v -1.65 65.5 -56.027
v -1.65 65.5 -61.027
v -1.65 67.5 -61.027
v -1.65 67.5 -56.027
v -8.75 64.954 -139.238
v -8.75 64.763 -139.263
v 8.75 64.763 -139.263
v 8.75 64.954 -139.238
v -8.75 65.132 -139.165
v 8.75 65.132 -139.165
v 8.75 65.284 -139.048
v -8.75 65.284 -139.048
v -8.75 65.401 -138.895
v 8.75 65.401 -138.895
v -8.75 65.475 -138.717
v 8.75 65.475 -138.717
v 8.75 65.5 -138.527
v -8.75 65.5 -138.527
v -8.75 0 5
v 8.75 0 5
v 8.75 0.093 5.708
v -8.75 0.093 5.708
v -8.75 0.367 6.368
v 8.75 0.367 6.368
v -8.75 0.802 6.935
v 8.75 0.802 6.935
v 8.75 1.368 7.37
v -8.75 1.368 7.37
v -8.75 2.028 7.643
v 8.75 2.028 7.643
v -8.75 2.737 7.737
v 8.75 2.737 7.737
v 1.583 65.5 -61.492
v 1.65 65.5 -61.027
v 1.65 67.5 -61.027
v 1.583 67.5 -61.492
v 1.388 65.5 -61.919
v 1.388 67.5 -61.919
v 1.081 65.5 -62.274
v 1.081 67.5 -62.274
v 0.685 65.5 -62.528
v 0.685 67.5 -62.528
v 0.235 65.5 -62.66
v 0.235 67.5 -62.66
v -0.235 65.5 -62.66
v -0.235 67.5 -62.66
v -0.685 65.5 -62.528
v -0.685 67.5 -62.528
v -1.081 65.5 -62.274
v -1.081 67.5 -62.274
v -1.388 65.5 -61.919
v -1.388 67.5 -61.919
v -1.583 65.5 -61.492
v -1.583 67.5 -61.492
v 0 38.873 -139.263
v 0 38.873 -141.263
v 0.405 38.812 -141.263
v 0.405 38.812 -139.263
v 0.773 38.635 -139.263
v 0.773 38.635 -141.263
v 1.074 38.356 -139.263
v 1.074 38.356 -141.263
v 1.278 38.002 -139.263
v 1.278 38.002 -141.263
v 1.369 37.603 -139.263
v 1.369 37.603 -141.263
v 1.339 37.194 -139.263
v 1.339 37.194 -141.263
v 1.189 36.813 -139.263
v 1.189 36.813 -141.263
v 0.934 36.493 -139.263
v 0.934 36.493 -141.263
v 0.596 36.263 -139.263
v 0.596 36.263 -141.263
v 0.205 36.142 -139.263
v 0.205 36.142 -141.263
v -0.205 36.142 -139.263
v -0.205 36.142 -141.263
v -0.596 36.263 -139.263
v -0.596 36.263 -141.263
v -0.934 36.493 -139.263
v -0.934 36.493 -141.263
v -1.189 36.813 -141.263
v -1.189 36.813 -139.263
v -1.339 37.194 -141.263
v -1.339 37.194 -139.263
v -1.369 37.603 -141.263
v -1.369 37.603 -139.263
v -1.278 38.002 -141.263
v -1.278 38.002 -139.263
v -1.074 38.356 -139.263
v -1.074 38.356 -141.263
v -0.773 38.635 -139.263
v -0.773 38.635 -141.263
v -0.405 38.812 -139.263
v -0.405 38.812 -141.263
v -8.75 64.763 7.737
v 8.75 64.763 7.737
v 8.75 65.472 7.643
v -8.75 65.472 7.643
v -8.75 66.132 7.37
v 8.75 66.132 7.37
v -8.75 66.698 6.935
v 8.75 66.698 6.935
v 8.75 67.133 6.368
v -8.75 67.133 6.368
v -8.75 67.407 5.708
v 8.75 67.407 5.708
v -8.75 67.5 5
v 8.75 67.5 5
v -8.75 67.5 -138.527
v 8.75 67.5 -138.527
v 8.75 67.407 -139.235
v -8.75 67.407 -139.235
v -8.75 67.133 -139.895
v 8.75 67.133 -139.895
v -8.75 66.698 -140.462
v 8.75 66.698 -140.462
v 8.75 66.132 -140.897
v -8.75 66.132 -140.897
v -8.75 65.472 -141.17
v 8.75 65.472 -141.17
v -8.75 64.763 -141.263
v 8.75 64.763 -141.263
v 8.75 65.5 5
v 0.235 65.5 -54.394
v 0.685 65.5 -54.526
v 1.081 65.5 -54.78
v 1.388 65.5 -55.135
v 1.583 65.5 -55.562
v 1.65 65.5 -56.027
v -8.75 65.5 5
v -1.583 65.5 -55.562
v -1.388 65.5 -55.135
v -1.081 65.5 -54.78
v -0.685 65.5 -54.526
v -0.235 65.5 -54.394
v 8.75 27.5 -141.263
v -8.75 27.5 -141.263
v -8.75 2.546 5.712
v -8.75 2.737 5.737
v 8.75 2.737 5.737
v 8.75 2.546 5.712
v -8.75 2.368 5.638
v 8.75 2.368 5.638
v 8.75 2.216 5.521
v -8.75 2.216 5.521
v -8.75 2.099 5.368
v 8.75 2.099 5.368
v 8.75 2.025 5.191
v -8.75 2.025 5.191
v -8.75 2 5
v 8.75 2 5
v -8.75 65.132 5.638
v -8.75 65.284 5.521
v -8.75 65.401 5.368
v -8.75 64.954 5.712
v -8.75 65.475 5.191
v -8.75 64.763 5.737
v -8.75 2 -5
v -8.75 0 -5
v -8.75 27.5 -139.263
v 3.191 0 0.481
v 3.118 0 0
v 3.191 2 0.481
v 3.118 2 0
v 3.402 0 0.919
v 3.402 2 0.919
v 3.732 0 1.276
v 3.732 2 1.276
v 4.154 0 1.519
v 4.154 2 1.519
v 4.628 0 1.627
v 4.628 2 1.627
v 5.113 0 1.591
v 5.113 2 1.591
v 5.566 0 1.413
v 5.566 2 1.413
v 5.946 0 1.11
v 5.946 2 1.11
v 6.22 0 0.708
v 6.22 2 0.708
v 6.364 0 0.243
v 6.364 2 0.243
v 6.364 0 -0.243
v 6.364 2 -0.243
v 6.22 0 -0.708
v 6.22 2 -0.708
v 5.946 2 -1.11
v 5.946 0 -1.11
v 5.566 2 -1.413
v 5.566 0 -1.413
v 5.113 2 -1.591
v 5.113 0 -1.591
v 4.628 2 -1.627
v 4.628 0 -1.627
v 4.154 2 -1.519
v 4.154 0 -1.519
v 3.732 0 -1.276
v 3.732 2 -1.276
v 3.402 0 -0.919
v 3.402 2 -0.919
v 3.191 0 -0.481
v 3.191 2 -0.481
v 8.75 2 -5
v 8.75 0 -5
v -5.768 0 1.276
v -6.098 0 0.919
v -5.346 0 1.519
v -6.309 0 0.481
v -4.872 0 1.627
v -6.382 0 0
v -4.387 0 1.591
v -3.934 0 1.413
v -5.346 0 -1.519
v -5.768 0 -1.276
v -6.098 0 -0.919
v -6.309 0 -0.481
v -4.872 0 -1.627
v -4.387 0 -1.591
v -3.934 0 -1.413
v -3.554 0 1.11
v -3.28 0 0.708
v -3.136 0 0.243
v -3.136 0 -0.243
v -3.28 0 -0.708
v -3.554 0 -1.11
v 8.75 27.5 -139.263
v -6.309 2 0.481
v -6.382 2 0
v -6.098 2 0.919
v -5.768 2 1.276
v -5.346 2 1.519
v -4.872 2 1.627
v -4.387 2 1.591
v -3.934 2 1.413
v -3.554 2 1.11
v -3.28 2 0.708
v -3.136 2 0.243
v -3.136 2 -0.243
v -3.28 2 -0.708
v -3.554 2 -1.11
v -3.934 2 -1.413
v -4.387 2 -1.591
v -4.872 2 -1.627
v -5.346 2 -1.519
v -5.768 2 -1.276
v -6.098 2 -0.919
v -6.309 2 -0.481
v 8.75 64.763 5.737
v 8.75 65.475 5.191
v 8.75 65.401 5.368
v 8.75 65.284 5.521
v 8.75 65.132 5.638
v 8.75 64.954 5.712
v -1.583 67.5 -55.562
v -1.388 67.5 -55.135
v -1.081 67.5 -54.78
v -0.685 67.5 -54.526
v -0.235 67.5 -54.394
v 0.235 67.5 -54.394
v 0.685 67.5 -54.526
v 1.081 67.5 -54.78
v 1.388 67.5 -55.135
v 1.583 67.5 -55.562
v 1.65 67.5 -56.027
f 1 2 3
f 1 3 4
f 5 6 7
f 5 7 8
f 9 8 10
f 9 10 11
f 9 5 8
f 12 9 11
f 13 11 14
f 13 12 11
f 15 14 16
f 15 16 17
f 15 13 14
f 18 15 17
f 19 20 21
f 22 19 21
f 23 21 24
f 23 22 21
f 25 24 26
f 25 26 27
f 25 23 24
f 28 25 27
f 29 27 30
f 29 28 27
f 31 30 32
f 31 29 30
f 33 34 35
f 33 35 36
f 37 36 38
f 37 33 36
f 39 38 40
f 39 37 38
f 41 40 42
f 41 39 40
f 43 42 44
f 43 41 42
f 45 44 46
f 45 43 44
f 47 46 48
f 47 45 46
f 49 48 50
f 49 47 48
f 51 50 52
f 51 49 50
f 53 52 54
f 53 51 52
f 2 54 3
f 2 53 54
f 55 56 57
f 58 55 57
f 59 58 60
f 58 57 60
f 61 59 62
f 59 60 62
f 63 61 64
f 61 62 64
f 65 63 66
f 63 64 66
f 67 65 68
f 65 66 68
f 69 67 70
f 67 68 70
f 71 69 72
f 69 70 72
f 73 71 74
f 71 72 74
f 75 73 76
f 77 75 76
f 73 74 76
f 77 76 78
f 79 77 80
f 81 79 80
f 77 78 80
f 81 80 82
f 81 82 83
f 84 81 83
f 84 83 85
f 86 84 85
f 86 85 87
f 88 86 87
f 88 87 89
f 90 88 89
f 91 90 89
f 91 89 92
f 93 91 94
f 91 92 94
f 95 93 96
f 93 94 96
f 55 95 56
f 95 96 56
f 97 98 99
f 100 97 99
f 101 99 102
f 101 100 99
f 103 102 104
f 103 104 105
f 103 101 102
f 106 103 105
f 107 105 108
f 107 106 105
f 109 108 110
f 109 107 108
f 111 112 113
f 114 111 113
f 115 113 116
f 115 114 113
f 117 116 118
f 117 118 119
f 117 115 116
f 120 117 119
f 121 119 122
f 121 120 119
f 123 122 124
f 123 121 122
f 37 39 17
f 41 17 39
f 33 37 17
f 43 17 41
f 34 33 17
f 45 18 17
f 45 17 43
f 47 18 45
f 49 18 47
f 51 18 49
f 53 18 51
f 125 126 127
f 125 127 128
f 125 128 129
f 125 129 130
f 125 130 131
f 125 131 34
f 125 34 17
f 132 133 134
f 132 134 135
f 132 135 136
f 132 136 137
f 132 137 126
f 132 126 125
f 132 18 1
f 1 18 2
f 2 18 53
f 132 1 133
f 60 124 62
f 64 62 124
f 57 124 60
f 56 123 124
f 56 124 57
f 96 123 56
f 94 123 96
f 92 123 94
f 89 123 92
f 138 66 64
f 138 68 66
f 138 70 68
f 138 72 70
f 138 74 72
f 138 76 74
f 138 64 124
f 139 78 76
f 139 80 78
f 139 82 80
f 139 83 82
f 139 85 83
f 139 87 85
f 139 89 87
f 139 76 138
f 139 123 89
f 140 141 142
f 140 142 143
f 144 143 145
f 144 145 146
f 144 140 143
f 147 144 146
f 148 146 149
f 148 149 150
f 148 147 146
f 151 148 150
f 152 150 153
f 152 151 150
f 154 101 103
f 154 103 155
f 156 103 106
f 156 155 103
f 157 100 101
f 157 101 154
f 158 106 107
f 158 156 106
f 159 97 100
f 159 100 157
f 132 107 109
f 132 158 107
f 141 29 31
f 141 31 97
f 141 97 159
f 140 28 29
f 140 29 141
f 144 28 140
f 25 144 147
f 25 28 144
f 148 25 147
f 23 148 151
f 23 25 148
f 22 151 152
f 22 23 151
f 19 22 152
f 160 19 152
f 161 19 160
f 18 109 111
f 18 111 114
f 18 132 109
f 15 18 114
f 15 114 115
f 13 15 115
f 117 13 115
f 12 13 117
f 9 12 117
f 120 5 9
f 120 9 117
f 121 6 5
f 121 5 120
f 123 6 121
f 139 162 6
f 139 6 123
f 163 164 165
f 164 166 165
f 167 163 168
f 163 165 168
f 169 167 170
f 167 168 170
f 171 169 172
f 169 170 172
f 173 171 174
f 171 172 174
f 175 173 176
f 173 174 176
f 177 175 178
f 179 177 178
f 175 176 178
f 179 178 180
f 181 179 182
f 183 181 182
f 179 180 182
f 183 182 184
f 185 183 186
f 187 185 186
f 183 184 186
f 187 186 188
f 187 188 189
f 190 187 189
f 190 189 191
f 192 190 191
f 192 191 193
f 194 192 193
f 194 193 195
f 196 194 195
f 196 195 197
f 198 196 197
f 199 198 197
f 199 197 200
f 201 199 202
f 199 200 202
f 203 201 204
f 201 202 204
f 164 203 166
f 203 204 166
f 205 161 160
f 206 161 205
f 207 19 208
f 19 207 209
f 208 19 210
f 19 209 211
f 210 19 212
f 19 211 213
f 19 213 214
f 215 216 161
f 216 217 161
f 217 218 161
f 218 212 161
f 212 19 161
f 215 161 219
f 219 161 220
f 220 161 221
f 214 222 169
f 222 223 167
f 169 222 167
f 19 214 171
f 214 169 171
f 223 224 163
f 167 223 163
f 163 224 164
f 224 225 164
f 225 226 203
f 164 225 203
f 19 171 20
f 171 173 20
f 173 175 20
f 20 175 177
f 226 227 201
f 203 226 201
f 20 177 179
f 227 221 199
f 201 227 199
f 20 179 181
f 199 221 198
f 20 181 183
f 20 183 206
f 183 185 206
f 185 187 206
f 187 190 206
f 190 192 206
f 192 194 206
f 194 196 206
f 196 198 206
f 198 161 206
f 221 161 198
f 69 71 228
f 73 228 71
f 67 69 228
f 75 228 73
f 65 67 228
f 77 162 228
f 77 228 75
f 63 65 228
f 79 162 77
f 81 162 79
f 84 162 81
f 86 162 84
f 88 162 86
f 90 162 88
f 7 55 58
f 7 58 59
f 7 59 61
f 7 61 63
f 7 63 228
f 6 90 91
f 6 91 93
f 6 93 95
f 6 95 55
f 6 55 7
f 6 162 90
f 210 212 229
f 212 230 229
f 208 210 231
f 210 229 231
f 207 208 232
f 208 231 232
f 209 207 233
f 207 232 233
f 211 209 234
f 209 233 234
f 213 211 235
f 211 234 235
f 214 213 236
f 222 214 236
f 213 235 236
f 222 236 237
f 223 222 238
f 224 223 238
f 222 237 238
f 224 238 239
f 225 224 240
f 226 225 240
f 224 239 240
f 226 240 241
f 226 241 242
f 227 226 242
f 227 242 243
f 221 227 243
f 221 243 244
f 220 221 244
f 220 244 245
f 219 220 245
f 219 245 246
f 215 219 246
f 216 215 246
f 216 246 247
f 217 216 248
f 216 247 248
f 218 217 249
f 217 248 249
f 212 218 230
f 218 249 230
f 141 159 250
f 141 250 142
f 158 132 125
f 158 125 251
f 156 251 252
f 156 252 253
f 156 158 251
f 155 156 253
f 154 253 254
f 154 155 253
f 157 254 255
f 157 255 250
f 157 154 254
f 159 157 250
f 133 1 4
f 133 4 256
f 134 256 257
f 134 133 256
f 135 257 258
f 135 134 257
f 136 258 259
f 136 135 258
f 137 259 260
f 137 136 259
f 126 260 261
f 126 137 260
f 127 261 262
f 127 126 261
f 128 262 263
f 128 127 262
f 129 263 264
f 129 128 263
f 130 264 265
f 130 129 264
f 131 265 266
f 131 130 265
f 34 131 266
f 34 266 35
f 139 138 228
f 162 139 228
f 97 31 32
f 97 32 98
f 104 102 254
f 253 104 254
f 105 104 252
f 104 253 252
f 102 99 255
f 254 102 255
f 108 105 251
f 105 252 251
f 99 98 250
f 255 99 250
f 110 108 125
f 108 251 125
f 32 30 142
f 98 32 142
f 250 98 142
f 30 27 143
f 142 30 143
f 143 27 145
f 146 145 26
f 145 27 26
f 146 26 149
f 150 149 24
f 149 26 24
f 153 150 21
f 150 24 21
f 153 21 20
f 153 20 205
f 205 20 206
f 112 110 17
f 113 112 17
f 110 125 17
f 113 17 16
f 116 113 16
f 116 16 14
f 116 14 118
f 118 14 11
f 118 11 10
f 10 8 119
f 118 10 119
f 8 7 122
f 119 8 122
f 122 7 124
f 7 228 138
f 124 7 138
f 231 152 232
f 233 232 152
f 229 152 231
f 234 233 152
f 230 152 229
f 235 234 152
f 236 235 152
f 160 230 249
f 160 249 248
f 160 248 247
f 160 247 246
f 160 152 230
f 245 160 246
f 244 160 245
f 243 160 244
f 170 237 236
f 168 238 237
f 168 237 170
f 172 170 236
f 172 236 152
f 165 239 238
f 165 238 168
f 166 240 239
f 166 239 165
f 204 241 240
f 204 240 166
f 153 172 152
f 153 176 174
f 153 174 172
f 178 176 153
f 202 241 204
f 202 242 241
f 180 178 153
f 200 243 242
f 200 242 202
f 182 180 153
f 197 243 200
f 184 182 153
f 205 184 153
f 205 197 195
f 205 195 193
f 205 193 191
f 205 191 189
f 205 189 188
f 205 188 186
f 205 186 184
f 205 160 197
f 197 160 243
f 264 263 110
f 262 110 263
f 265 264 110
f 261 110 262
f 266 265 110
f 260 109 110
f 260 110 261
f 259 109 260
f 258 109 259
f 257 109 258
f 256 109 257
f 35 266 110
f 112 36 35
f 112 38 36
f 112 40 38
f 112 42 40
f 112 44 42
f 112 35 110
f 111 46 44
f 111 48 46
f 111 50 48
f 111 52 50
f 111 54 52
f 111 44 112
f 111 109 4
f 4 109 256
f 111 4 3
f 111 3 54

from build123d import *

# Parameters (mm, degrees)
SKETCH1_W                    = 17.5
SKETCH1_H                    = 10
BASE_FLANGE1_DEPTH           = 2
EDGE_FLANGE1_DEPTH           = 17.5
EDGE_FLANGE2_STRIP_W         = 9.4732
EDGE_FLANGE2_STRIP_H         = 2
EDGE_FLANGE2_STRIP_CUT_DEPTH = 17.5
EDGE_FLANGE2_DEPTH           = 17.5
EDGE_FLANGE3_STRIP_W         = 9.4732
EDGE_FLANGE3_STRIP_H         = 2
EDGE_FLANGE3_STRIP_CUT_DEPTH = 17.5
EDGE_FLANGE3_DEPTH           = 17.5
F_4_CLEARANCE_HOLE1_D        = 3.2639
F_4_CLEARANCE_HOLE1_DEPTH    = 2
F_4_CLEARANCE_HOLE1_TIP      = 0.980574487
CUT_EXTRUDE3_DEPTH           = 2
SKETCH25_R                   = 1.373100621
CUT_EXTRUDE4_DEPTH           = 2


# Sheet-metal steps are written as plain solids
with BuildPart() as part:
    # Sketch1 → Base-Flange1 (new body)
    with BuildSketch(Plane(origin=(0, 0, 0), x_dir=(1, 0, 0), z_dir=(0, 1, 0))):
        Rectangle(SKETCH1_W, SKETCH1_H)
    extrude(amount=BASE_FLANGE1_DEPTH)

    # Edge-Flange1 section (across the edge) → Edge-Flange1 (add)
    with BuildSketch(Plane(origin=(-8.75, 2, 5.7366), x_dir=(0, 0, -1), z_dir=(1, 0, 0))):
        with BuildLine():
            Line((-2, 0.7366), (-2, 65.5))
            Line((-2, 65.5), (0, 65.5))
            Line((0, 65.5), (0, 0.7366))
            ThreePointArc((0, 0.7366), (0.215745145, 0.215745145), (0.7366, 0))
            Line((0.7366, 0), (0.7366, -2))
            ThreePointArc((0.7366, -2), (-1.198468417, -1.198468417), (-2, 0.7366))
        make_face()
    extrude(amount=EDGE_FLANGE1_DEPTH)

    # Edge-Flange2 strip (across the edge) → Edge-Flange2 strip cut (cut)
    with BuildSketch(Plane(origin=(-8.75, 67.5, 5.7366), x_dir=(0, -1, 0), z_dir=(1, 0, 0))):
        with Locations((-2, -1)):
            Rectangle(EDGE_FLANGE2_STRIP_W, EDGE_FLANGE2_STRIP_H)
    extrude(amount=EDGE_FLANGE2_STRIP_CUT_DEPTH, mode=Mode.SUBTRACT)

    # Edge-Flange2 section (across the edge) → Edge-Flange2 (add)
    with BuildSketch(Plane(origin=(-8.75, 67.5, 5.7366), x_dir=(0, -1, 0), z_dir=(1, 0, 0))):
        with BuildLine():
            Line((0, 0.7366), (0, 147))
            Line((0, 147), (2, 147))
            Line((2, 147), (2, 0.7366))
            ThreePointArc((2, 0.7366), (2.215745145, 0.215745145), (2.7366, 0))
            Line((2.7366, 0), (2.7366, -2))
            ThreePointArc((2.7366, -2), (0.801531583, -1.198468417), (0, 0.7366))
        make_face()
    extrude(amount=EDGE_FLANGE2_DEPTH)

    # Edge-Flange3 strip (across the edge) → Edge-Flange3 strip cut (cut)
    with BuildSketch(Plane(origin=(-8.75, 65.5, -141.2634), x_dir=(0, 0, 1), z_dir=(1, 0, 0))):
        with Locations((-2, -1)):
            Rectangle(EDGE_FLANGE3_STRIP_W, EDGE_FLANGE3_STRIP_H)
    extrude(amount=EDGE_FLANGE3_STRIP_CUT_DEPTH, mode=Mode.SUBTRACT)

    # Edge-Flange3 section (across the edge) → Edge-Flange3 (add)
    with BuildSketch(Plane(origin=(-8.75, 65.5, -141.2634), x_dir=(0, 0, 1), z_dir=(1, 0, 0))):
        with BuildLine():
            Line((0, 0.7366), (0, 38))
            Line((0, 38), (2, 38))
            Line((2, 38), (2, 0.7366))
            ThreePointArc((2, 0.7366), (2.215745145, 0.215745145), (2.7366, 0))
            Line((2.7366, 0), (2.7366, -2))
            ThreePointArc((2.7366, -2), (0.801531583, -1.198468417), (0, 0.7366))
        make_face()
    extrude(amount=EDGE_FLANGE3_DEPTH)

    # #4 Clearance Hole1
    with Locations(Plane.XZ):
        with Locations((4.75, 0), (-4.75, 0)):
            Hole(F_4_CLEARANCE_HOLE1_D / 2, depth=F_4_CLEARANCE_HOLE1_DEPTH)
            with Locations((0, 0, -(F_4_CLEARANCE_HOLE1_DEPTH + F_4_CLEARANCE_HOLE1_TIP / 2))):  # 118° drill point
                Cone(0, F_4_CLEARANCE_HOLE1_D / 2, F_4_CLEARANCE_HOLE1_TIP, mode=Mode.SUBTRACT)

    # Sketch23 → Cut-Extrude3 (cut)
    with BuildSketch(Plane.XZ.offset(-65.5)):
        with BuildLine():
            Line((-1.65, -61.0268), (-1.65, -56.0268))
            ThreePointArc((-1.65, -56.0268), (0, -54.3768), (1.65, -56.0268))
            Line((1.65, -56.0268), (1.65, -61.0268))
            ThreePointArc((1.65, -61.0268), (0, -62.6768), (-1.65, -61.0268))
        make_face()
    extrude(amount=-CUT_EXTRUDE3_DEPTH, mode=Mode.SUBTRACT)

    # Sketch25 → Cut-Extrude4 (cut)
    with BuildSketch(Plane(origin=(0, 0, -141.2634), x_dir=(-1, 0, 0), z_dir=(0, 0, -1))):
        with Locations(Location((0, 37.5, 0), (0, 0, 90))):
            Circle(SKETCH25_R)
    extrude(amount=-CUT_EXTRUDE4_DEPTH, mode=Mode.SUBTRACT)


solid = part.part
